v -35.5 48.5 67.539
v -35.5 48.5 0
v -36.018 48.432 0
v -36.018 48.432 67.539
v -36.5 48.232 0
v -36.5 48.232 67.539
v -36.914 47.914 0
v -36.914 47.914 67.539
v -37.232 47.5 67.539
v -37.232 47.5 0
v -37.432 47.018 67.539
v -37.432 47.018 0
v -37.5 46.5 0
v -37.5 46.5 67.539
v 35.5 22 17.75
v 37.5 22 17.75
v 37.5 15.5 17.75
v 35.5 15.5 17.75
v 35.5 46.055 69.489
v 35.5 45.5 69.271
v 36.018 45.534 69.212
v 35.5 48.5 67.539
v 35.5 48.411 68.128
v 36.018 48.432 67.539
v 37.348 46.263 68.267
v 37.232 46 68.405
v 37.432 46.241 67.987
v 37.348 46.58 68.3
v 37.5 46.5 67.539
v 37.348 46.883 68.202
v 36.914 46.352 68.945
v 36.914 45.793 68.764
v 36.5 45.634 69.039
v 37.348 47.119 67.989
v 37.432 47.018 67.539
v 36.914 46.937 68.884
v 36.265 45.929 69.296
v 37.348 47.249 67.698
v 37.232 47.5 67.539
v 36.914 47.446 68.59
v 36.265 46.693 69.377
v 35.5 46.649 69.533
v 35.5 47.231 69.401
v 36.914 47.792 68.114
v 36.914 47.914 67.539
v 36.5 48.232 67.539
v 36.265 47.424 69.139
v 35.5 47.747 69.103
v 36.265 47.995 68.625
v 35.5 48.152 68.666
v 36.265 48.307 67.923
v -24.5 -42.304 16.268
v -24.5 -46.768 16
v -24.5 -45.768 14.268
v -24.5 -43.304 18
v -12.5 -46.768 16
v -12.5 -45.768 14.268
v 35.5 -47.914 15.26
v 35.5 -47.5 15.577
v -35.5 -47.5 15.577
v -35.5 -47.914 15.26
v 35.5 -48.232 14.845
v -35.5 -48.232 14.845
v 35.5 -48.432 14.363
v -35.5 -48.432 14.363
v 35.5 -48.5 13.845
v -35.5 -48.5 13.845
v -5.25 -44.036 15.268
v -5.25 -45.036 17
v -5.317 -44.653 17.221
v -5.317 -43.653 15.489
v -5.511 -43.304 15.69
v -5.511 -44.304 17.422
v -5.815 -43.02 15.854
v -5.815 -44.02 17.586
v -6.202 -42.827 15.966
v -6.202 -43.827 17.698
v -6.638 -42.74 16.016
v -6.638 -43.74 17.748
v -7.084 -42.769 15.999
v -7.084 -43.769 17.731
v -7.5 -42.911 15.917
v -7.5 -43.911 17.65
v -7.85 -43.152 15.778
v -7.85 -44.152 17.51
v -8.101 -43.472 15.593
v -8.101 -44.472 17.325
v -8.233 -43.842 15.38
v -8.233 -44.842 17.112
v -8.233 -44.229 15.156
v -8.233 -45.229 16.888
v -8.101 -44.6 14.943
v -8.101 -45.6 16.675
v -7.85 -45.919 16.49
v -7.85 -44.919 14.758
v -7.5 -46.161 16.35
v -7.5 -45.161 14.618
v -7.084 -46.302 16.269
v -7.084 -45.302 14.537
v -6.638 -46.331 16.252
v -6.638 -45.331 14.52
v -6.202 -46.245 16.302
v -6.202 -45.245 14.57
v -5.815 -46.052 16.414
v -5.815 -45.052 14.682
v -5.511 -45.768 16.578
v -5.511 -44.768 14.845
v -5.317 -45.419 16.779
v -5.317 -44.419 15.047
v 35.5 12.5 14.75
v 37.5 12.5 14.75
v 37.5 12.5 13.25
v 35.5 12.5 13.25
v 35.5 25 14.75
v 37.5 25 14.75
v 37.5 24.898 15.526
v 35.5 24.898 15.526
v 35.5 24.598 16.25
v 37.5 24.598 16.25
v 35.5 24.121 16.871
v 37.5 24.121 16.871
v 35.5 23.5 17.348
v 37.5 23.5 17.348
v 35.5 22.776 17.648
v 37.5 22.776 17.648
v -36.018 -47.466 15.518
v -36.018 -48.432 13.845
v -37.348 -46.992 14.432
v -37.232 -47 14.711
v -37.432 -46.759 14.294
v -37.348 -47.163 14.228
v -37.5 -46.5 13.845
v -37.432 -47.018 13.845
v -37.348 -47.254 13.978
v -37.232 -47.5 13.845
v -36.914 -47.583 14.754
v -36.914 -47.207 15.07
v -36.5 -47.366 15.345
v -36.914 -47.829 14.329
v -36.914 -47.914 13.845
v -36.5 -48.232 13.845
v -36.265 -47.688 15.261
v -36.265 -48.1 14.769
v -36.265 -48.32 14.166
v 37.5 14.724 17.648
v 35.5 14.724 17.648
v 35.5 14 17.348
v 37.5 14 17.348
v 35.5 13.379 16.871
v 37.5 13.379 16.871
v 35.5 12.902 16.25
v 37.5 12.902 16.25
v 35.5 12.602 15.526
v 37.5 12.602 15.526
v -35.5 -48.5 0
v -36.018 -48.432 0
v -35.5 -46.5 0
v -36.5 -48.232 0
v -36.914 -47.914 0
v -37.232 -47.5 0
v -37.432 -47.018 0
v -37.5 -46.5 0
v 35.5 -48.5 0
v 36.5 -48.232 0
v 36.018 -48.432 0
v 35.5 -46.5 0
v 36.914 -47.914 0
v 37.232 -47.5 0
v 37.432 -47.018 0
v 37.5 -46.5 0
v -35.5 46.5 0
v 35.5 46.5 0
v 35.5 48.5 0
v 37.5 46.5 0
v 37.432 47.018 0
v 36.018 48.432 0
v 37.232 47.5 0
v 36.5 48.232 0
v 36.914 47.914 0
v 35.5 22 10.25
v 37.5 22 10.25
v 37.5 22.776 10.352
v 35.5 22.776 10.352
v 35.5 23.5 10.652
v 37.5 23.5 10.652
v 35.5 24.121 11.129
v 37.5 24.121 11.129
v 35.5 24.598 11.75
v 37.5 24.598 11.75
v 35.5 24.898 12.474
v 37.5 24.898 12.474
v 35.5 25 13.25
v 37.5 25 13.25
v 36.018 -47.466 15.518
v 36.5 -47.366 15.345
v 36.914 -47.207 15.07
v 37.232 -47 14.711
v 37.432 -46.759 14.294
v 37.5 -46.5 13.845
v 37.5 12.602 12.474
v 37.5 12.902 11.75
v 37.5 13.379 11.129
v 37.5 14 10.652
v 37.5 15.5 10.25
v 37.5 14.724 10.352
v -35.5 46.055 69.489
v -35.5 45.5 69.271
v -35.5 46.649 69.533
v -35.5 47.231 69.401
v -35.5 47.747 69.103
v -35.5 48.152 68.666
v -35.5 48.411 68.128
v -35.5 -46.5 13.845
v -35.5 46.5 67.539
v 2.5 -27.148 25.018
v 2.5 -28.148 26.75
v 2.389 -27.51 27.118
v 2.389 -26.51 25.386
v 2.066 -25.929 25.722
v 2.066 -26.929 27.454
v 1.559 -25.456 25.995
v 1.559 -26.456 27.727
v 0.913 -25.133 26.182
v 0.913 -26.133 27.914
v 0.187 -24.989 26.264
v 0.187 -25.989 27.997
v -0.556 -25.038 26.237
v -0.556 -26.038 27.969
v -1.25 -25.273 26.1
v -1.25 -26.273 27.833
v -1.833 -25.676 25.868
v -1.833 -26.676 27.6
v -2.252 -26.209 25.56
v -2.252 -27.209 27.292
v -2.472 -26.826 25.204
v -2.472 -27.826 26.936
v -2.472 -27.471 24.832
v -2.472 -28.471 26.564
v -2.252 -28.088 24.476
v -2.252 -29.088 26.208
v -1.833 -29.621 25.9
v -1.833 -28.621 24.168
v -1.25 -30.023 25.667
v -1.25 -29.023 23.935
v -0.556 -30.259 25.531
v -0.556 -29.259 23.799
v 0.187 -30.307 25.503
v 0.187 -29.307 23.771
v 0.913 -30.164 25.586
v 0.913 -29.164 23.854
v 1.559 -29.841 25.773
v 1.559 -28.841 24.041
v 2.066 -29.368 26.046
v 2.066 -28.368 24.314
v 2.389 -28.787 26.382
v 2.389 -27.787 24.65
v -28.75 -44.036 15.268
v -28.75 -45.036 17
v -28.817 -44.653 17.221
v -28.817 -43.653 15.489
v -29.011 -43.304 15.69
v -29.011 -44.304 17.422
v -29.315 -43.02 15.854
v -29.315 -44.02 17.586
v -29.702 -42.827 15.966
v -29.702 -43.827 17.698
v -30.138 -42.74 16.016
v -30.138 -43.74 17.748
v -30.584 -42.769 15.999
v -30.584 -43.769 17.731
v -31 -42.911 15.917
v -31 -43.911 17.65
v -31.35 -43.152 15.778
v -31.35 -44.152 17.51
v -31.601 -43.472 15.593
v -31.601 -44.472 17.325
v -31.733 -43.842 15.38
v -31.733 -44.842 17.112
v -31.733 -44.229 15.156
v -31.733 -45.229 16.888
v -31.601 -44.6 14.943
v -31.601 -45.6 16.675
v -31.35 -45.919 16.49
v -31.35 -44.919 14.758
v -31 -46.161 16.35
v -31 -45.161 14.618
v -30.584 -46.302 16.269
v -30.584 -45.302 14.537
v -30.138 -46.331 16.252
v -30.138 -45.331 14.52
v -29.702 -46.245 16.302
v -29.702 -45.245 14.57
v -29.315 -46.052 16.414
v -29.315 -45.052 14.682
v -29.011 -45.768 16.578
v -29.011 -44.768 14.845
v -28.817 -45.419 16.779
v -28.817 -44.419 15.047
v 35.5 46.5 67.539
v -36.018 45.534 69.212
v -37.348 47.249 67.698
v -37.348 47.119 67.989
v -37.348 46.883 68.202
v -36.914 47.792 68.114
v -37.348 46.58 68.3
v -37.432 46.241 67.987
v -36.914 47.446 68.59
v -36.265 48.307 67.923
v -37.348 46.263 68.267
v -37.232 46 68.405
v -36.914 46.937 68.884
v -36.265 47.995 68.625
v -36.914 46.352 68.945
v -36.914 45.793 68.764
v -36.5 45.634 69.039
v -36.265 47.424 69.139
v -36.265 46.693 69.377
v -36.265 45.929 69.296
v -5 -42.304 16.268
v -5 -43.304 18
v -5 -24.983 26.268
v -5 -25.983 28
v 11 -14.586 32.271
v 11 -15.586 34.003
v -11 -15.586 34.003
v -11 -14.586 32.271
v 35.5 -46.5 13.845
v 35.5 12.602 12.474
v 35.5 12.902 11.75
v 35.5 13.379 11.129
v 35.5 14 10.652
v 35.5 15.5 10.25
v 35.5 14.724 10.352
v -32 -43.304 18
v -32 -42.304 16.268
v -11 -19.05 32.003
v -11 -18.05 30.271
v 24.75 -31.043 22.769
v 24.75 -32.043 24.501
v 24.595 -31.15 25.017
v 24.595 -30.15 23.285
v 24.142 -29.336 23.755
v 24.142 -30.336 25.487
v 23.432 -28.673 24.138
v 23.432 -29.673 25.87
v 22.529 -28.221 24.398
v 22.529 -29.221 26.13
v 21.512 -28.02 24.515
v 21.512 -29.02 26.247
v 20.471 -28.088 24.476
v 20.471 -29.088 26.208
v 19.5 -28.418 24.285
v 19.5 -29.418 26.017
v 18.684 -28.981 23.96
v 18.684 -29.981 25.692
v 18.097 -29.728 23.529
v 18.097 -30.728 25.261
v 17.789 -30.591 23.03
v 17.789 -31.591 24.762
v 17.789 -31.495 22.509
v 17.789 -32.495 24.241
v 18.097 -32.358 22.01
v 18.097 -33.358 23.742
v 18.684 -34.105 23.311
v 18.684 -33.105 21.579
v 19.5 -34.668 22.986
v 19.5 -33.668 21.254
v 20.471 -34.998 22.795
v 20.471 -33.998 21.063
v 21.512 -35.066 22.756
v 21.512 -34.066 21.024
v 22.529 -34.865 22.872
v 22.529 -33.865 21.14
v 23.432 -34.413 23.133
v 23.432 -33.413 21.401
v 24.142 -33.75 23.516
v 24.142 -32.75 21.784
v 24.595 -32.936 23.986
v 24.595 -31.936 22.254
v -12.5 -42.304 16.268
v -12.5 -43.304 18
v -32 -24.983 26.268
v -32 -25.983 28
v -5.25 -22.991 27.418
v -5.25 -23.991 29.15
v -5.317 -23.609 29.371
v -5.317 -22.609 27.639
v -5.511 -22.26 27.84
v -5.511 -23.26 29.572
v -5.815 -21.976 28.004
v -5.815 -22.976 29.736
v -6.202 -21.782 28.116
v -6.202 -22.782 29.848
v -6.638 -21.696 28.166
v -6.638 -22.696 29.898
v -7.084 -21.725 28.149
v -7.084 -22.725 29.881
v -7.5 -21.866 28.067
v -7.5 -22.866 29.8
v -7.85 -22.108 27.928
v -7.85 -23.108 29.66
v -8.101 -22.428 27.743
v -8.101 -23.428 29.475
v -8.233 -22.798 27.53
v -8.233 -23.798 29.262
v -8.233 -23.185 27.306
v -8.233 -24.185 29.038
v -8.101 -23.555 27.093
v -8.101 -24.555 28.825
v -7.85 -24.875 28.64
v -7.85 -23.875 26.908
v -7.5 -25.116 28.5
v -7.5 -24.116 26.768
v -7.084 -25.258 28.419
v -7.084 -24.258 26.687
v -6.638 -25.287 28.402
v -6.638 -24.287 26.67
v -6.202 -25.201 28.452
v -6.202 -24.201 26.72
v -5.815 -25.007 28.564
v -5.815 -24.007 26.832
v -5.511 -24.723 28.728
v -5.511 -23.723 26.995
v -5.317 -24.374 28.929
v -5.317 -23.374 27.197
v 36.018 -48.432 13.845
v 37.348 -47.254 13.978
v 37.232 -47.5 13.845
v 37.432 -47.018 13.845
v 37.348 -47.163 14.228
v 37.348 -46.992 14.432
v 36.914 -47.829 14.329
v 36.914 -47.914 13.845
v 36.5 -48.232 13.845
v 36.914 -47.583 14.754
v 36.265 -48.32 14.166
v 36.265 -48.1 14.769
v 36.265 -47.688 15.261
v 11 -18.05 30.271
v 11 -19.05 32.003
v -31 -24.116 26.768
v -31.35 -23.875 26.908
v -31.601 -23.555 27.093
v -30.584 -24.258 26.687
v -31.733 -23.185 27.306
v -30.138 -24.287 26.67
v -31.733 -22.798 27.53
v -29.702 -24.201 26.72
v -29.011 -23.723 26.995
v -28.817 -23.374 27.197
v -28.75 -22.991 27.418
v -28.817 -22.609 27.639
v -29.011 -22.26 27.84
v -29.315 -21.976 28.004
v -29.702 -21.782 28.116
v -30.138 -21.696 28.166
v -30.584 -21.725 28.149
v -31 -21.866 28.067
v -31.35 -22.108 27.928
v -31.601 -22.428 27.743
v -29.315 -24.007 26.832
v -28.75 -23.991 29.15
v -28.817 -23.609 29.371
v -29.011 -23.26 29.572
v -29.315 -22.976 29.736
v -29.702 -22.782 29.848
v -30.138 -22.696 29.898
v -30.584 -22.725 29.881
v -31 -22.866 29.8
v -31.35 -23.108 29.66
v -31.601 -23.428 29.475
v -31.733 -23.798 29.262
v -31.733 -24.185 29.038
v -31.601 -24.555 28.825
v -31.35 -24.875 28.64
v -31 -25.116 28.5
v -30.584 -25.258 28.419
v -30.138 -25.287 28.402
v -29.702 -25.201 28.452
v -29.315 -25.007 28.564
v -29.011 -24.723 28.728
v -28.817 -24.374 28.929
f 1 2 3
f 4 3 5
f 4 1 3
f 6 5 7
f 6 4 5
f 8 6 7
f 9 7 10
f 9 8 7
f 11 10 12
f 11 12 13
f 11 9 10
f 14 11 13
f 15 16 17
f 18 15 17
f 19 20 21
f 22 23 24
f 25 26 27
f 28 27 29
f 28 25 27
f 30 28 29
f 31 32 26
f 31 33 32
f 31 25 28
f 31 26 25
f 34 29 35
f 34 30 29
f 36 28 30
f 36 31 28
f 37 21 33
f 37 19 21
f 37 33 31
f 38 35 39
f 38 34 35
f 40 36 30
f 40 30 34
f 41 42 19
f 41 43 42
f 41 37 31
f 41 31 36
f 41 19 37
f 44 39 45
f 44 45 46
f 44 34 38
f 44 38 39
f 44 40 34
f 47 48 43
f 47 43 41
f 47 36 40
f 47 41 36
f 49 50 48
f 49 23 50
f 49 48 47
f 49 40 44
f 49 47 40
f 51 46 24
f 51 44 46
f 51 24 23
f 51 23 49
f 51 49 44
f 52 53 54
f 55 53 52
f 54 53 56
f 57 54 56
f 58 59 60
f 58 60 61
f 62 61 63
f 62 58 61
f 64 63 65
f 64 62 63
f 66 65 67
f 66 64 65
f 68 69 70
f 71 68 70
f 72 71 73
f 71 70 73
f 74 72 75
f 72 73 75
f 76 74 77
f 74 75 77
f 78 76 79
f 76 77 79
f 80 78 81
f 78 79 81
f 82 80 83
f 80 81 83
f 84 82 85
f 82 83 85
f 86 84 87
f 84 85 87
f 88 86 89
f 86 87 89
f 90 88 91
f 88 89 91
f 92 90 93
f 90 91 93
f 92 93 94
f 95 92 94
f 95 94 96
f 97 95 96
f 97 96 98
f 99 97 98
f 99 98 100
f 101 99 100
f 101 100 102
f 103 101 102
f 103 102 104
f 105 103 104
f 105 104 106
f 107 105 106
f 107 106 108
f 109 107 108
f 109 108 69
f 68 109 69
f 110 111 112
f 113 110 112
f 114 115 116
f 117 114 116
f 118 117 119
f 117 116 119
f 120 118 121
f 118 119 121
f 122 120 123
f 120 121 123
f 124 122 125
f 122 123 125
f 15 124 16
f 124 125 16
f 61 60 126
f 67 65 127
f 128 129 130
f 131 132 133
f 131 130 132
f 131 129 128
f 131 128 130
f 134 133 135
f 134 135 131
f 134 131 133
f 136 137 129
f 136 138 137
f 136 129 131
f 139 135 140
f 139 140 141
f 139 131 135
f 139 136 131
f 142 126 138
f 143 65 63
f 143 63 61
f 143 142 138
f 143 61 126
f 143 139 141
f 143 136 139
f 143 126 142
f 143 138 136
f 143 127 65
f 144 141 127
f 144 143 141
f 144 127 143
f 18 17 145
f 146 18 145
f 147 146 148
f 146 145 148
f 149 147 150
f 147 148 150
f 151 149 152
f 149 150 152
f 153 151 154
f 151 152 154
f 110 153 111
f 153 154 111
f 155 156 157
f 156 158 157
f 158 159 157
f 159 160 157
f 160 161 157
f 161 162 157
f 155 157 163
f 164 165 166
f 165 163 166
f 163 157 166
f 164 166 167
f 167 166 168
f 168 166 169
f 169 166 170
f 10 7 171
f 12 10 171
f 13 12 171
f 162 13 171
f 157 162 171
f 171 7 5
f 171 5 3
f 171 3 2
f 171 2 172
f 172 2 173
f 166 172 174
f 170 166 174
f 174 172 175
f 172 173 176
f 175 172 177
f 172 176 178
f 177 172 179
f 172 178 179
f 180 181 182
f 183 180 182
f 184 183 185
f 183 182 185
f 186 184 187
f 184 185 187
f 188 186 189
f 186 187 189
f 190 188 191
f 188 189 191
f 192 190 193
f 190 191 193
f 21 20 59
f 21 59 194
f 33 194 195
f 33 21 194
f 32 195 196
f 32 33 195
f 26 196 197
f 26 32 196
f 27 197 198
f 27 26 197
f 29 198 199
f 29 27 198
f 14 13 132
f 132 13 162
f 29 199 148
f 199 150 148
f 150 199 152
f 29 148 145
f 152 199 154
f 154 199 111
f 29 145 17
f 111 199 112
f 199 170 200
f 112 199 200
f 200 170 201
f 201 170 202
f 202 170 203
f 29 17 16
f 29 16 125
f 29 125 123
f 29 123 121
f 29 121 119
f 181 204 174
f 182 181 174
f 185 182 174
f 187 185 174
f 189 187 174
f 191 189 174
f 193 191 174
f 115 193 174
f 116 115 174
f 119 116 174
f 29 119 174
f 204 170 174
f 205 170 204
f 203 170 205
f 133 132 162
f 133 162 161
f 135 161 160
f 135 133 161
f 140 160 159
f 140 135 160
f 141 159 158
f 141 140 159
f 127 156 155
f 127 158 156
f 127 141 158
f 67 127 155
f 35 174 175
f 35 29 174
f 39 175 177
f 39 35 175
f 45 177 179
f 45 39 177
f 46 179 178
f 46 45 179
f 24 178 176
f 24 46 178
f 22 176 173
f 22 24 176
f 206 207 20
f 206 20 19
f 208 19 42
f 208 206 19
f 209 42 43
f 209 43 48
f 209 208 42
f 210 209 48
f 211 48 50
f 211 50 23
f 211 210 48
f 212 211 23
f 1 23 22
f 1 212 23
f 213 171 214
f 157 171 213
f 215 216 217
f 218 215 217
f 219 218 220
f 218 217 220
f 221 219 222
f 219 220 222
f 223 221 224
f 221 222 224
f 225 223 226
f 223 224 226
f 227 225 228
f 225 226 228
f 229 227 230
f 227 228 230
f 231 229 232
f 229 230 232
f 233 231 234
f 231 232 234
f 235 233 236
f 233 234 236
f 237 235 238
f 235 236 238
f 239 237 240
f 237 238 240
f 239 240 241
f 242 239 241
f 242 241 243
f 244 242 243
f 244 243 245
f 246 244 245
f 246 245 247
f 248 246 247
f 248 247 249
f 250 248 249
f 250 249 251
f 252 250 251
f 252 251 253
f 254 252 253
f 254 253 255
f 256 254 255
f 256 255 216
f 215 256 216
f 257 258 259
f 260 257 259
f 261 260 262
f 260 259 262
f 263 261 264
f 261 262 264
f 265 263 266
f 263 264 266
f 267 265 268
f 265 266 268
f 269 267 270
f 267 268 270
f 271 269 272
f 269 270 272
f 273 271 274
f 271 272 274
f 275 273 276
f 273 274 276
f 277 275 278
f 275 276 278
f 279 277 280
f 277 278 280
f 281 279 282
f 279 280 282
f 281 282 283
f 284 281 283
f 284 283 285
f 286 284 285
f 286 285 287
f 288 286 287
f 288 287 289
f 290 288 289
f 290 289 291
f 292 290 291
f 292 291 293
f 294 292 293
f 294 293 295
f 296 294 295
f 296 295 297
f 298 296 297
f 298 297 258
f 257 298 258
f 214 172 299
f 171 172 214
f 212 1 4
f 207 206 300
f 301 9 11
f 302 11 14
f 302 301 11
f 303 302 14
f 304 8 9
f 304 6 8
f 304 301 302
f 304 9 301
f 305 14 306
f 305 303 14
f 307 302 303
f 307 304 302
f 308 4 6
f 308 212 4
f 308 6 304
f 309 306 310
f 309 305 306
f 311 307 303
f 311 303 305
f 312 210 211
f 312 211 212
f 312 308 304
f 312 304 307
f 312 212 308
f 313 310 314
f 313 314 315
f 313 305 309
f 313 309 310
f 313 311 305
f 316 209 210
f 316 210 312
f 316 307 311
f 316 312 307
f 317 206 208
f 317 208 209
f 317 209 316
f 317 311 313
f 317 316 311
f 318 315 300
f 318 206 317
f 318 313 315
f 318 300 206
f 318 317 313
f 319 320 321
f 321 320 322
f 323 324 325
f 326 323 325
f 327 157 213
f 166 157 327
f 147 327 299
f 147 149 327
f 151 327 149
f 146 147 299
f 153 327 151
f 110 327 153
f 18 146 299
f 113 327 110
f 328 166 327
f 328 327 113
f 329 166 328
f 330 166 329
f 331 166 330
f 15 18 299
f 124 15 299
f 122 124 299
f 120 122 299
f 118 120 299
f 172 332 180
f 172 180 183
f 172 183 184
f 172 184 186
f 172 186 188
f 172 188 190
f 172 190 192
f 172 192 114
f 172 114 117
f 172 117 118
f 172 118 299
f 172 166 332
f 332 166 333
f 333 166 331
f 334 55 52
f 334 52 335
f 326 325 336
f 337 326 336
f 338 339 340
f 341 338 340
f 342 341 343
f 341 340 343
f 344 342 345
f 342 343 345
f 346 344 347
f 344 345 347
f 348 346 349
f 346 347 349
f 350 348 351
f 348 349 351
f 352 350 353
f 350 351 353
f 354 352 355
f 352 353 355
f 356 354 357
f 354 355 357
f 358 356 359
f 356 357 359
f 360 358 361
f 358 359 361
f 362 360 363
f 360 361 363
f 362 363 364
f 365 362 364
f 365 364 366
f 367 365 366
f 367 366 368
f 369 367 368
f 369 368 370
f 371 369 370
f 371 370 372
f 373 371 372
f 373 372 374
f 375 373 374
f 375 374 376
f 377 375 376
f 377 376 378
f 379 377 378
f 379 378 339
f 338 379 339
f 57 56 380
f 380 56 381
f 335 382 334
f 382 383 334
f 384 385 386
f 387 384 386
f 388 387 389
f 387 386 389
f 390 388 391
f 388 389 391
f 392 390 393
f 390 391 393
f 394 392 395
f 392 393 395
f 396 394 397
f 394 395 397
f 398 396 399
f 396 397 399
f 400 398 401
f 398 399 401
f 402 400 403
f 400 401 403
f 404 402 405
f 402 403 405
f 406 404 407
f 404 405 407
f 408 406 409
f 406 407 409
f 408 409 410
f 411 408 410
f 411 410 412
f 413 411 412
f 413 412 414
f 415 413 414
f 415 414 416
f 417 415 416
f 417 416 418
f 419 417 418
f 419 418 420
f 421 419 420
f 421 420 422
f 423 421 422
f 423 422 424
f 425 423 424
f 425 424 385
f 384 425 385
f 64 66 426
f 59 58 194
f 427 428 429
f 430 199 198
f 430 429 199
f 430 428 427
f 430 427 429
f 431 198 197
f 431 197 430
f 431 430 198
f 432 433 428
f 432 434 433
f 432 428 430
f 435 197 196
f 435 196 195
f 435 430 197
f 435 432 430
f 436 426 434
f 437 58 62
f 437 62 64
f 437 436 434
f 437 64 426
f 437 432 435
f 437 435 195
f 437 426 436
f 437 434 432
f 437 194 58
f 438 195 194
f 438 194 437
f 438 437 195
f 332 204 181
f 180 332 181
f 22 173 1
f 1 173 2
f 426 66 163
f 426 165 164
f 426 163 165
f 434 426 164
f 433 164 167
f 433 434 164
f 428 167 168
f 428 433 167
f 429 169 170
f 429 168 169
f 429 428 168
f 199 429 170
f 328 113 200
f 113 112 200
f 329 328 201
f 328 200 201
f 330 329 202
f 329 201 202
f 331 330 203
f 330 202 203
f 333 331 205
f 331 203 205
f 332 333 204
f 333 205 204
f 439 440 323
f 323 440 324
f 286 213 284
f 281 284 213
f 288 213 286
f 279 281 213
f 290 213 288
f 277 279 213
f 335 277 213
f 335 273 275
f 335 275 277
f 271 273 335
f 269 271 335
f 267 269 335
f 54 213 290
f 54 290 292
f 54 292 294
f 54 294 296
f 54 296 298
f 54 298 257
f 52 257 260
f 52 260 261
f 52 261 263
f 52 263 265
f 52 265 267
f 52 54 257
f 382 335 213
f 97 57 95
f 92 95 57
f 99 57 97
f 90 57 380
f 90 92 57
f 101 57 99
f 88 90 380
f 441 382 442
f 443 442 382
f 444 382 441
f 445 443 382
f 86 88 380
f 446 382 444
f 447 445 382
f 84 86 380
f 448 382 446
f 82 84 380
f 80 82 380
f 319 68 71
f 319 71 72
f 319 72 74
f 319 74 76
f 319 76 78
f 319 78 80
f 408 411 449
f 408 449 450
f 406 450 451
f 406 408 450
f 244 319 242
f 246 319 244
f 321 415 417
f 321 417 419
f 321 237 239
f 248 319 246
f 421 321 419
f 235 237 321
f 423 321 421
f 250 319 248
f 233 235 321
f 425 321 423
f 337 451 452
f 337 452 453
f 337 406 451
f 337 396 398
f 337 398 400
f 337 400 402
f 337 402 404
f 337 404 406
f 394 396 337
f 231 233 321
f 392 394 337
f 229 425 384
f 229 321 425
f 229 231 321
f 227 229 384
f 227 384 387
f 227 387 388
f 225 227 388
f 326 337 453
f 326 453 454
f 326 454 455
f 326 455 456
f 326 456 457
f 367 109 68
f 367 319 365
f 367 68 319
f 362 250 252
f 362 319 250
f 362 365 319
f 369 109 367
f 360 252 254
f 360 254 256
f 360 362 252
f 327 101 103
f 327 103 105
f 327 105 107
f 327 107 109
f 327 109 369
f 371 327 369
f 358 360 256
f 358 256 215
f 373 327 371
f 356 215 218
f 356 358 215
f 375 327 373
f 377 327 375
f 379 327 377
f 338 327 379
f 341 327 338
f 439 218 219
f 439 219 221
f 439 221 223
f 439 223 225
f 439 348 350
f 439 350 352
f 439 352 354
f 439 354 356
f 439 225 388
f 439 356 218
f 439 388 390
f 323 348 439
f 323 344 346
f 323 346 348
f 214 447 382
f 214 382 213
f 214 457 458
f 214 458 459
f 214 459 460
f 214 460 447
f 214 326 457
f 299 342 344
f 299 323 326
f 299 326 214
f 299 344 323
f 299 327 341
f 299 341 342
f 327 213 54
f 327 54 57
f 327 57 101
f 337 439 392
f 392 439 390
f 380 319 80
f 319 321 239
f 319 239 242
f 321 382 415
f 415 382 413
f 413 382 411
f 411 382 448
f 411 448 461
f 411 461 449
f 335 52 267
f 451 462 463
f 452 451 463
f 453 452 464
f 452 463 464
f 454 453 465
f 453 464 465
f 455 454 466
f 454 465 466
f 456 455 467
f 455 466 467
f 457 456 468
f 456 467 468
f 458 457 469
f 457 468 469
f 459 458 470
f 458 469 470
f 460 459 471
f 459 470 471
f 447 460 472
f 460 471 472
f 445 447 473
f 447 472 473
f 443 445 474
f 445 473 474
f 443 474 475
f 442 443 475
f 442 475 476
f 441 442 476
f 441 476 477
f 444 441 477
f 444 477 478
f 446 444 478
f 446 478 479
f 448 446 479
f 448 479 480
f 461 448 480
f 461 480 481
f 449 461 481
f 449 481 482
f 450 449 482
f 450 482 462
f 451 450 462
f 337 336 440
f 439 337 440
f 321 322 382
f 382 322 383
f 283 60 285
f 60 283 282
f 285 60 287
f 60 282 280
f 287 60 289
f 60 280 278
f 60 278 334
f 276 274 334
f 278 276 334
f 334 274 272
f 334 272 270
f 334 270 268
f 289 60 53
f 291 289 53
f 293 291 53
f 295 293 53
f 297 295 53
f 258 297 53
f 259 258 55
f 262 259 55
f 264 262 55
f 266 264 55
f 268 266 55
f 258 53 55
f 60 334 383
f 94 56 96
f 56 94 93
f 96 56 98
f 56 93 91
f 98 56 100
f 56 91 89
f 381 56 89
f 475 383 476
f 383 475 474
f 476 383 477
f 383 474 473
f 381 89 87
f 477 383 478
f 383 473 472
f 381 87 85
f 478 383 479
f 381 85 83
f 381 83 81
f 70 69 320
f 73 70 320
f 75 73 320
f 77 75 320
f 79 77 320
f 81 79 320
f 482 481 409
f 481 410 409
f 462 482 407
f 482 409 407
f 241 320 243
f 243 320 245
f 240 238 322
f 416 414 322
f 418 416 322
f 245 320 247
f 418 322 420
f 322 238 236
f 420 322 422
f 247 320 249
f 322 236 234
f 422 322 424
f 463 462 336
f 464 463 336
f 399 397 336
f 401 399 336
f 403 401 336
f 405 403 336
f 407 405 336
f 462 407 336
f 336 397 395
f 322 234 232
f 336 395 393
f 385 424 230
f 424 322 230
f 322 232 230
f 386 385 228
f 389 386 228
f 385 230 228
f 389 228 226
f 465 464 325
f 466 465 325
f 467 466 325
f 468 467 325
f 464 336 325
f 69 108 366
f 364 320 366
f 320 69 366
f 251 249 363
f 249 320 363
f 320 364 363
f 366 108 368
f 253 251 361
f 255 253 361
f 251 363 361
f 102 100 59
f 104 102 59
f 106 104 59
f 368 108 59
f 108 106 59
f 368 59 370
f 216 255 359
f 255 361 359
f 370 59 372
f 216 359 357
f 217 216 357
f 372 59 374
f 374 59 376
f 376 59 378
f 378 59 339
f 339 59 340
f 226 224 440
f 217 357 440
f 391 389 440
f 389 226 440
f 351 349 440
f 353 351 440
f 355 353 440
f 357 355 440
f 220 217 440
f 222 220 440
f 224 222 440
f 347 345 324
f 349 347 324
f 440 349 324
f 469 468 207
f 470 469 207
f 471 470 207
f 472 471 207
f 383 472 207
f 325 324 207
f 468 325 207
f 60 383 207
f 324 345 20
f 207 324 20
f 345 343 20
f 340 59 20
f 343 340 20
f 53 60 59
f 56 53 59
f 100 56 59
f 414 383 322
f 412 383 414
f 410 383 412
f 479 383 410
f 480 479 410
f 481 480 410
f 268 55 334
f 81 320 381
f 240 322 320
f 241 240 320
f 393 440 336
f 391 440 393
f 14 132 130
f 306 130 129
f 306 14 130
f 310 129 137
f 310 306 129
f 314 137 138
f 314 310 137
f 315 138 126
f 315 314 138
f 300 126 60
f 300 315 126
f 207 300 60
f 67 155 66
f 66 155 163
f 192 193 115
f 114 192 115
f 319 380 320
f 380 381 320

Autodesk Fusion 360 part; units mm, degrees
sketch "Sketch1" plane through (0, 0, 0) normal (0, 0, 1) x (1, 0, 0)
  line L0 (37.5, 48.5) -> (-37.5, 48.5)
  line L1 (-37.5, 48.5) -> (-37.5, -48.5)
  line L2 (-37.5, -48.5) -> (37.5, -48.5)
  line L3 (37.5, -48.5) -> (37.5, 48.5)
  line L4 (37.5, 48.5) -> (-37.5, -48.5) construction
  line L5 (-37.5, 48.5) -> (37.5, -48.5) construction
  dimension "d1" = 75
  dimension "d2" = 97
extrude "Extrude1" add sketch "Sketch1" along normal blind 15
sketch "Sketch2" plane through (37.5, 0, 0) normal (1, 0, 0) x (0, 1, 0)
  line L0 (-48.5, 0) -> (48.5, 0)
  line L1 (48.5, 0) -> (48.5, 15)
  line L2 (48.5, 15) -> (-48.5, 15)
  line L3 (-48.5, 15) -> (-48.5, 0)
  line L4 (-48.5, 15) -> (48.5, 71.003)
  line L5 (-48.5, 15) -> (74.9401, 15) construction
  line L6 (48.5, 71.003) -> (48.5, 15)
  dimension "d5" = 30
extrude "Extrude2" add sketch "Sketch2" against normal up to surface (75 mm away) contours L2 L4 L6
sketch "Sketch3" plane through (0, -18.6202, 32.2511) normal (0, -0.5, 0.866) x (1, 0, 0)
  line L0 (-37.5, 77.5037) -> (-37.5, -34.5022)
  line L1 (-37.5, -34.5022) -> (37.5, -34.5022)
  line L2 (37.5, -34.5022) -> (37.5, 77.5037)
  line L3 (37.5, 77.5037) -> (-37.5, 77.5037)
  line L4 (11, 3.5037) -> (-11, 3.5037)
  line L5 (-11, 3.5037) -> (-11, -0.4963)
  line L6 (-11, -0.4963) -> (11, -0.4963)
  line L7 (11, -0.4963) -> (11, 3.5037)
  line L8 (11, 3.5037) -> (-11, -0.4963) construction
  line L9 (-11, 3.5037) -> (11, -0.4963) construction
  line L10 (-32, -32.5022) -> (-5, -32.5022)
  line L11 (-5, -32.5022) -> (-5, -8.5022)
  line L12 (-5, -8.5022) -> (-32, -8.5022)
  line L13 (-32, -8.5022) -> (-32, -32.5022)
  circle A0 centre (-30.25, -6.2022) radius 1.5
  circle A1 centre (-6.75, -6.2022) radius 1.5
  circle A2 centre (21.25, -15.4993) radius 3.5
  line L14 (-32, -32.5022) -> (-24.5, -32.5022)
  line L15 (-24.5, -32.5022) -> (-24.5, -28.5022)
  line L16 (-24.5, -28.5022) -> (-32, -28.5022)
  line L17 (-32, -28.5022) -> (-32, -32.5022)
  line L18 (-5, -32.5022) -> (-12.5, -32.5022)
  line L19 (-12.5, -32.5022) -> (-12.5, -28.5022)
  line L20 (-12.5, -28.5022) -> (-5, -28.5022)
  line L21 (-5, -28.5022) -> (-5, -32.5022)
  circle A3 centre (-6.75, -30.5022) radius 1.5
  circle A4 centre (-30.25, -30.5022) radius 1.5
  line L22 (11, 3.5037) -> (37.5, 3.5037) construction
  line L23 (-11, 3.5037) -> (-37.5, 3.5037) construction
  line L24 (21.25, 3.5037) -> (21.25, -34.5022) construction
  circle A5 centre (0, -11.0022) radius 2.5
  line L25 (-5, -8.5022) -> (6, -8.5022) construction
  point P0 (0, 1.5037)
  dimension "d8" = 22
  dimension "d9" = 4
  dimension "d10" = 74
  dimension "d11" = 27
  dimension "d12" = 24
  dimension "d14" = 2
  dimension "d17" = 3
  dimension "d18" = 2.3
  dimension "d20" = 2.3
  dimension "d22" = 7
  dimension "d37" = 3
  dimension "d38" = 7.5
  dimension "d39" = 4
  dimension "d40" = 7.5
  dimension "d41" = 4
  dimension "d42" = 3
  dimension "d43" = 2
  dimension "d44" = 1.75
  dimension "d45" = 23.5
  dimension "d46" = 24.3
  dimension "d54" = 1.75
  dimension "d55" = 1.75
  dimension "d56" = 16.25
  dimension "d57" = 5
  dimension "d58" = 5
shell "Shell1" thickness 2 removed faces 1 at (-12.5, -16.1667, 0)
extrude "Extrude3" cut sketch "Sketch3" against normal blind 14 contours L4 L5 L6 L7 | L10 L11 L12 L13 L15 L16 L19 L20 | A0 | A1 | A2 | A3 | A4 | A5
sketch "Sketch4" plane through (37.5, 0, 0) normal (1, 0, 0) x (0, 1, 0)
  line L0 (-48.5, 0) -> (48.5, 0)
  line L1 (48.5, 0) -> (48.5, 71.003)
  line L2 (48.5, 71.003) -> (-48.5, 15)
  line L3 (-48.5, 15) -> (-48.5, 0)
sketch "Sketch5" plane through (37.5, 0, 0) normal (1, 0, 0) x (0, 1, 0)
  line L0 (15.5, 10.25) -> (22, 10.25)
  line L1 (25, 13.25) -> (25, 14.75)
  line L2 (22, 17.75) -> (15.5, 17.75)
  line L3 (12.5, 14.75) -> (12.5, 13.25)
  arc A0 (15.5, 17.75) -> (12.5, 14.75) centre (15.5, 14.75) ccw
  arc A1 (12.5, 13.25) -> (15.5, 10.25) centre (15.5, 13.25) ccw
  arc A2 (25, 14.75) -> (22, 17.75) centre (22, 14.75) ccw
  arc A3 (22, 10.25) -> (25, 13.25) centre (22, 13.25) ccw
  line L4 (18.75, 17.75) -> (18.75, 10.25) construction
  line L5 (12.5, 14) -> (25, 14) construction
  line L6 (-48.5, 0) -> (48.5, 0) construction
  line L7 (48.5, 0) -> (48.5, 71.003) construction
  point P0 (12.5, 10.25)
  point P1 (25, 10.25)
  point P2 (12.5, 17.75)
  dimension "d28" = 12.5
  dimension "d29" = 7.5
  dimension "d30" = 3
  dimension "d31" = 14
  dimension "d32" = 29.75
extrude "Extrude4" cut sketch "Sketch5" against normal blind 4
fillet "Fillet1" radius 2 8 edges at (0, 48.5, 71.003) (-37.5, 0, 43.0015) (0, -48.5, 15) (-37.5, -48.5, 7.5) (-37.5, 48.5, 35.5015) (37.5, 0, 43.0015) (37.5, -48.5, 7.5) (37.5, 48.5, 35.5015)
